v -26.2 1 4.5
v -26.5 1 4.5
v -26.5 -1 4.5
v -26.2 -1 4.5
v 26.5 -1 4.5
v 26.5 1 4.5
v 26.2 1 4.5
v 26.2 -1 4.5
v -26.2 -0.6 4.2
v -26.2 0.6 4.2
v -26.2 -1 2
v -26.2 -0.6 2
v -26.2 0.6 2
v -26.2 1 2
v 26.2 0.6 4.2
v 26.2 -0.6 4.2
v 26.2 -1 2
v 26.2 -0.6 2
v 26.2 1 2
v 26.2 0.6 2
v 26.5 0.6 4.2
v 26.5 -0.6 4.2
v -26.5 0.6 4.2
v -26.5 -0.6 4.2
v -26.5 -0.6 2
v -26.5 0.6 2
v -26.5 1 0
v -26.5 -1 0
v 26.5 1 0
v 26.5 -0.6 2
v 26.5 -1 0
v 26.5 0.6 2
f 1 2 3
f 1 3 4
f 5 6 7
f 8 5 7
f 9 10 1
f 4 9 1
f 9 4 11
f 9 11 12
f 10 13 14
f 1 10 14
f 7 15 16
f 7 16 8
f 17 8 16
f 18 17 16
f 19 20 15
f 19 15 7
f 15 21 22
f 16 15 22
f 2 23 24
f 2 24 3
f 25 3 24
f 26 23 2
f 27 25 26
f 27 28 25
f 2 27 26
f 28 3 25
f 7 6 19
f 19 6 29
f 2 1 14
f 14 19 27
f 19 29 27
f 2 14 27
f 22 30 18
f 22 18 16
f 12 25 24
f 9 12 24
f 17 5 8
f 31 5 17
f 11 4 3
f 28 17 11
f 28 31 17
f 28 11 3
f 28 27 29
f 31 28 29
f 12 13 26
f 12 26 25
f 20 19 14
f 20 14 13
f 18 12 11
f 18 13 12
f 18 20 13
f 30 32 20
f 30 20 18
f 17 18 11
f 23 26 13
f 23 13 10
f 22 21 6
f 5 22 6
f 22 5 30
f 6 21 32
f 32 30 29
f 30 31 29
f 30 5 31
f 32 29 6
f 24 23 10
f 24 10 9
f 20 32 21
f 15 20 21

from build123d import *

# Parameters (mm, degrees)
SKETCH_W     = 53
SKETCH_H     = 2
PAD_DEPTH    = 2
SKETCH001_W  = 0.3
SKETCH001_H  = 2
PAD001_DEPTH = 2.5
SKETCH002_W  = 1.2
SKETCH002_H  = 2.2
POCKET_DEPTH = 0.3


with BuildPart() as part:
    # Sketch → Pad (new body)
    with BuildSketch(Plane.XY):
        Rectangle(SKETCH_W, SKETCH_H)
    extrude(amount=PAD_DEPTH)

    # Sketch001 (on Face6 of Pad) → Pad001 (join)
    with BuildSketch(Plane.XY.offset(2)):
        with Locations((-26.35, 0)):
            Rectangle(SKETCH001_W, SKETCH001_H)
    pad001 = extrude(amount=PAD001_DEPTH)

    # Sketch002 (on Face8 of Pad001) → Pocket (cut)
    with BuildSketch(Plane(origin=(-26.5, 0, 0), x_dir=(0, -1, 0), z_dir=(-1, 0, 0))):
        with Locations((0, 3.1)):
            Rectangle(SKETCH002_W, SKETCH002_H)
    pocket = extrude(amount=-POCKET_DEPTH, mode=Mode.SUBTRACT)

    # Mirrored: Pad001 across Sketch001 V_Axis
    add(pad001.mirror(Plane(origin=(0, 0, 2), x_dir=(0, 0, 1), z_dir=(1, 0, 0))))

    # Mirrored001: Pocket across YZ
    add(pocket.mirror(Plane.YZ), mode=Mode.SUBTRACT)


solid = part.part
